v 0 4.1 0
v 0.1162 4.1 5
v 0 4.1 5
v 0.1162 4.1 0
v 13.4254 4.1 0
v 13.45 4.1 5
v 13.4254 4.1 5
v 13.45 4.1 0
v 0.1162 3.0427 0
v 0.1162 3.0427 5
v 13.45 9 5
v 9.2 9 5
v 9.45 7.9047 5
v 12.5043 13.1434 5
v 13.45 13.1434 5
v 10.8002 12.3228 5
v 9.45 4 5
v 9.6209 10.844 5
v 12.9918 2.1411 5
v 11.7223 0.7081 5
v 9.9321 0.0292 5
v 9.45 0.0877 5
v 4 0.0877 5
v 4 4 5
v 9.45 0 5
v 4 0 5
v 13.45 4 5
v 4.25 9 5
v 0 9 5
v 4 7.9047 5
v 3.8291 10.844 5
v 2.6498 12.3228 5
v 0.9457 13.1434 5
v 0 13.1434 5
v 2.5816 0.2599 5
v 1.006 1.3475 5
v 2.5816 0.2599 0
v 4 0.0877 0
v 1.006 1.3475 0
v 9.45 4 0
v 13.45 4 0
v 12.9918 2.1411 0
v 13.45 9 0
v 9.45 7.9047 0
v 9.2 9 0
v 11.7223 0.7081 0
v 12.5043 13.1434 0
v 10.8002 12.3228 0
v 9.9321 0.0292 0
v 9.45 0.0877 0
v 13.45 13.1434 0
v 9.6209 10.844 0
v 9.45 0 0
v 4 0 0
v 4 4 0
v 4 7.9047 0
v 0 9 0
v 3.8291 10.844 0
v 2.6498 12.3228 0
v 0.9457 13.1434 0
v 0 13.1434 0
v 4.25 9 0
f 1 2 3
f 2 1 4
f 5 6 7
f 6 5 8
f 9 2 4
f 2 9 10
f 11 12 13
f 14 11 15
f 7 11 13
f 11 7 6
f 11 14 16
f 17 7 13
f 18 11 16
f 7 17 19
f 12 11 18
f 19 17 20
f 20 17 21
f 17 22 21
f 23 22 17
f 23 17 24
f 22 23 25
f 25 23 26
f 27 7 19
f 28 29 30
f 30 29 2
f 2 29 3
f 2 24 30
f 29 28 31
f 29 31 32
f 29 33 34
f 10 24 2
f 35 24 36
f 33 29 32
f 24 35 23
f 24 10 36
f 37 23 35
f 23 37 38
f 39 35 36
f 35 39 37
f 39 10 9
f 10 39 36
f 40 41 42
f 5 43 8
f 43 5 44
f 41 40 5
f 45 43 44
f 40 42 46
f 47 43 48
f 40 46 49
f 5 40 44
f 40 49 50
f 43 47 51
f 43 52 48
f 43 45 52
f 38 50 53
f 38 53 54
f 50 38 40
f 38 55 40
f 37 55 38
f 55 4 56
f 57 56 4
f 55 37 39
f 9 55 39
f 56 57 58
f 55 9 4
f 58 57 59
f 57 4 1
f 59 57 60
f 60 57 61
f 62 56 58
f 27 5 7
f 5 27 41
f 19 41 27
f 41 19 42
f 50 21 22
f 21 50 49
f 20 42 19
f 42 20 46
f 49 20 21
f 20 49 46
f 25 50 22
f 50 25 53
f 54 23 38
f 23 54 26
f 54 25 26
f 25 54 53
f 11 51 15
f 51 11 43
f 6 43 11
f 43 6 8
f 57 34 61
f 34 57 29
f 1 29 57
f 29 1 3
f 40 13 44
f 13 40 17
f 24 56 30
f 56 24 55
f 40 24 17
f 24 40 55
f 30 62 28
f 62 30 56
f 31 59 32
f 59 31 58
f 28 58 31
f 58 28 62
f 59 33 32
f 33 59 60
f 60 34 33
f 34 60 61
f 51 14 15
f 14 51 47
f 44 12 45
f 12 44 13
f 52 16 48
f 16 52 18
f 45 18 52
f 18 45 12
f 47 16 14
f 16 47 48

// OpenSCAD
bed_thick=3.2;				//thickness of bed plate to clamp glass onto
glass_thick=2.25;		//thickness of glass plate to be clamped
width=5;					//how wide the clip will be
clip_thick=4;				//thickness of the clip bars
depth=5;					//how deep the clip will go onto the glass
nub=.25;					//how much the nubs should be smaller than the bed-glass combo for a tight fit


union(){
	difference(){
		cube([bed_thick+glass_thick+2*clip_thick,depth+clip_thick,width]);
		translate([clip_thick,clip_thick,-0.1])
			cube([bed_thick+glass_thick,depth+0.1,width+0.2]);
		difference(){
			translate([-0.1,-0.1,-0.1])
				cube([bed_thick+glass_thick+2*clip_thick+0.2,clip_thick+0.2,width+0.2]);
			translate([clip_thick,clip_thick,0])
				cylinder(h=width,r=clip_thick);
			translate([clip_thick+glass_thick+bed_thick,clip_thick,0])
				cylinder(h=width,r=clip_thick);
			translate([clip_thick,0,-0.1])
				cube([glass_thick+bed_thick,clip_thick,width+0.2]);
		}
	}
	difference(){
		translate([0,clip_thick+depth,0])
			cylinder(h=width,r=clip_thick+nub);
		translate([-clip_thick-nub,0,-0.1])
			cube([clip_thick+nub,100,width+0.2]);
	}
	difference(){
		translate([bed_thick+glass_thick+2*clip_thick,clip_thick+depth,0])
			cylinder(h=width,r=clip_thick+nub);
		translate([bed_thick+glass_thick+2*clip_thick,0,-0.1])
			cube([clip_thick+nub,100,width+0.2]);
	}

}
